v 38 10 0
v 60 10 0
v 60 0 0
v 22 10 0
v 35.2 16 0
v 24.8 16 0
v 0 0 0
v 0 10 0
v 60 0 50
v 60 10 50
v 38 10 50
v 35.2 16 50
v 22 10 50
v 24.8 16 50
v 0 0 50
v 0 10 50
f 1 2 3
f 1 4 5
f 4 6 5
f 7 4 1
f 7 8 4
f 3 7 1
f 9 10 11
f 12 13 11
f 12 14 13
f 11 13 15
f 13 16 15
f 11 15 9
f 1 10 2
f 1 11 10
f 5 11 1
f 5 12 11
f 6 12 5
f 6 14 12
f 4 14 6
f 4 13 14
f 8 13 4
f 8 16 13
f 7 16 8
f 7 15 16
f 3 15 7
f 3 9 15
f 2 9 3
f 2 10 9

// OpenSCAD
$fn = 32;

// ----------------------------------------------------------------------
// V guide rail: dovetail, 60 mm wide
// ----------------------------------------------------------------------

// --- parameters (mm) ---
rail_w = 60;              // rail width, X
base_t = 10;              // base plate thickness
v_depth = 6;              // V feature depth / height
v_half_w = 8;             // half width of the V at the base face
plate_t = 50;             // rail length, Z (the extrusion height)
top_half_w = 5.2;         // half width at the dovetail top

dovetail_base = 2 * v_half_w;  // dovetail width at the base
dovetail_top = 2 * top_half_w;  // dovetail width at the top

profile = [[0, 0], [60, 0], [60, 10], [38, 10], [35.2, 16], [24.8, 16], [22, 10], [0, 10]];  // primary outline, 8 points, counter clockwise

// --- the one profile operation ---
linear_extrude(height = plate_t) polygon(points = profile);
